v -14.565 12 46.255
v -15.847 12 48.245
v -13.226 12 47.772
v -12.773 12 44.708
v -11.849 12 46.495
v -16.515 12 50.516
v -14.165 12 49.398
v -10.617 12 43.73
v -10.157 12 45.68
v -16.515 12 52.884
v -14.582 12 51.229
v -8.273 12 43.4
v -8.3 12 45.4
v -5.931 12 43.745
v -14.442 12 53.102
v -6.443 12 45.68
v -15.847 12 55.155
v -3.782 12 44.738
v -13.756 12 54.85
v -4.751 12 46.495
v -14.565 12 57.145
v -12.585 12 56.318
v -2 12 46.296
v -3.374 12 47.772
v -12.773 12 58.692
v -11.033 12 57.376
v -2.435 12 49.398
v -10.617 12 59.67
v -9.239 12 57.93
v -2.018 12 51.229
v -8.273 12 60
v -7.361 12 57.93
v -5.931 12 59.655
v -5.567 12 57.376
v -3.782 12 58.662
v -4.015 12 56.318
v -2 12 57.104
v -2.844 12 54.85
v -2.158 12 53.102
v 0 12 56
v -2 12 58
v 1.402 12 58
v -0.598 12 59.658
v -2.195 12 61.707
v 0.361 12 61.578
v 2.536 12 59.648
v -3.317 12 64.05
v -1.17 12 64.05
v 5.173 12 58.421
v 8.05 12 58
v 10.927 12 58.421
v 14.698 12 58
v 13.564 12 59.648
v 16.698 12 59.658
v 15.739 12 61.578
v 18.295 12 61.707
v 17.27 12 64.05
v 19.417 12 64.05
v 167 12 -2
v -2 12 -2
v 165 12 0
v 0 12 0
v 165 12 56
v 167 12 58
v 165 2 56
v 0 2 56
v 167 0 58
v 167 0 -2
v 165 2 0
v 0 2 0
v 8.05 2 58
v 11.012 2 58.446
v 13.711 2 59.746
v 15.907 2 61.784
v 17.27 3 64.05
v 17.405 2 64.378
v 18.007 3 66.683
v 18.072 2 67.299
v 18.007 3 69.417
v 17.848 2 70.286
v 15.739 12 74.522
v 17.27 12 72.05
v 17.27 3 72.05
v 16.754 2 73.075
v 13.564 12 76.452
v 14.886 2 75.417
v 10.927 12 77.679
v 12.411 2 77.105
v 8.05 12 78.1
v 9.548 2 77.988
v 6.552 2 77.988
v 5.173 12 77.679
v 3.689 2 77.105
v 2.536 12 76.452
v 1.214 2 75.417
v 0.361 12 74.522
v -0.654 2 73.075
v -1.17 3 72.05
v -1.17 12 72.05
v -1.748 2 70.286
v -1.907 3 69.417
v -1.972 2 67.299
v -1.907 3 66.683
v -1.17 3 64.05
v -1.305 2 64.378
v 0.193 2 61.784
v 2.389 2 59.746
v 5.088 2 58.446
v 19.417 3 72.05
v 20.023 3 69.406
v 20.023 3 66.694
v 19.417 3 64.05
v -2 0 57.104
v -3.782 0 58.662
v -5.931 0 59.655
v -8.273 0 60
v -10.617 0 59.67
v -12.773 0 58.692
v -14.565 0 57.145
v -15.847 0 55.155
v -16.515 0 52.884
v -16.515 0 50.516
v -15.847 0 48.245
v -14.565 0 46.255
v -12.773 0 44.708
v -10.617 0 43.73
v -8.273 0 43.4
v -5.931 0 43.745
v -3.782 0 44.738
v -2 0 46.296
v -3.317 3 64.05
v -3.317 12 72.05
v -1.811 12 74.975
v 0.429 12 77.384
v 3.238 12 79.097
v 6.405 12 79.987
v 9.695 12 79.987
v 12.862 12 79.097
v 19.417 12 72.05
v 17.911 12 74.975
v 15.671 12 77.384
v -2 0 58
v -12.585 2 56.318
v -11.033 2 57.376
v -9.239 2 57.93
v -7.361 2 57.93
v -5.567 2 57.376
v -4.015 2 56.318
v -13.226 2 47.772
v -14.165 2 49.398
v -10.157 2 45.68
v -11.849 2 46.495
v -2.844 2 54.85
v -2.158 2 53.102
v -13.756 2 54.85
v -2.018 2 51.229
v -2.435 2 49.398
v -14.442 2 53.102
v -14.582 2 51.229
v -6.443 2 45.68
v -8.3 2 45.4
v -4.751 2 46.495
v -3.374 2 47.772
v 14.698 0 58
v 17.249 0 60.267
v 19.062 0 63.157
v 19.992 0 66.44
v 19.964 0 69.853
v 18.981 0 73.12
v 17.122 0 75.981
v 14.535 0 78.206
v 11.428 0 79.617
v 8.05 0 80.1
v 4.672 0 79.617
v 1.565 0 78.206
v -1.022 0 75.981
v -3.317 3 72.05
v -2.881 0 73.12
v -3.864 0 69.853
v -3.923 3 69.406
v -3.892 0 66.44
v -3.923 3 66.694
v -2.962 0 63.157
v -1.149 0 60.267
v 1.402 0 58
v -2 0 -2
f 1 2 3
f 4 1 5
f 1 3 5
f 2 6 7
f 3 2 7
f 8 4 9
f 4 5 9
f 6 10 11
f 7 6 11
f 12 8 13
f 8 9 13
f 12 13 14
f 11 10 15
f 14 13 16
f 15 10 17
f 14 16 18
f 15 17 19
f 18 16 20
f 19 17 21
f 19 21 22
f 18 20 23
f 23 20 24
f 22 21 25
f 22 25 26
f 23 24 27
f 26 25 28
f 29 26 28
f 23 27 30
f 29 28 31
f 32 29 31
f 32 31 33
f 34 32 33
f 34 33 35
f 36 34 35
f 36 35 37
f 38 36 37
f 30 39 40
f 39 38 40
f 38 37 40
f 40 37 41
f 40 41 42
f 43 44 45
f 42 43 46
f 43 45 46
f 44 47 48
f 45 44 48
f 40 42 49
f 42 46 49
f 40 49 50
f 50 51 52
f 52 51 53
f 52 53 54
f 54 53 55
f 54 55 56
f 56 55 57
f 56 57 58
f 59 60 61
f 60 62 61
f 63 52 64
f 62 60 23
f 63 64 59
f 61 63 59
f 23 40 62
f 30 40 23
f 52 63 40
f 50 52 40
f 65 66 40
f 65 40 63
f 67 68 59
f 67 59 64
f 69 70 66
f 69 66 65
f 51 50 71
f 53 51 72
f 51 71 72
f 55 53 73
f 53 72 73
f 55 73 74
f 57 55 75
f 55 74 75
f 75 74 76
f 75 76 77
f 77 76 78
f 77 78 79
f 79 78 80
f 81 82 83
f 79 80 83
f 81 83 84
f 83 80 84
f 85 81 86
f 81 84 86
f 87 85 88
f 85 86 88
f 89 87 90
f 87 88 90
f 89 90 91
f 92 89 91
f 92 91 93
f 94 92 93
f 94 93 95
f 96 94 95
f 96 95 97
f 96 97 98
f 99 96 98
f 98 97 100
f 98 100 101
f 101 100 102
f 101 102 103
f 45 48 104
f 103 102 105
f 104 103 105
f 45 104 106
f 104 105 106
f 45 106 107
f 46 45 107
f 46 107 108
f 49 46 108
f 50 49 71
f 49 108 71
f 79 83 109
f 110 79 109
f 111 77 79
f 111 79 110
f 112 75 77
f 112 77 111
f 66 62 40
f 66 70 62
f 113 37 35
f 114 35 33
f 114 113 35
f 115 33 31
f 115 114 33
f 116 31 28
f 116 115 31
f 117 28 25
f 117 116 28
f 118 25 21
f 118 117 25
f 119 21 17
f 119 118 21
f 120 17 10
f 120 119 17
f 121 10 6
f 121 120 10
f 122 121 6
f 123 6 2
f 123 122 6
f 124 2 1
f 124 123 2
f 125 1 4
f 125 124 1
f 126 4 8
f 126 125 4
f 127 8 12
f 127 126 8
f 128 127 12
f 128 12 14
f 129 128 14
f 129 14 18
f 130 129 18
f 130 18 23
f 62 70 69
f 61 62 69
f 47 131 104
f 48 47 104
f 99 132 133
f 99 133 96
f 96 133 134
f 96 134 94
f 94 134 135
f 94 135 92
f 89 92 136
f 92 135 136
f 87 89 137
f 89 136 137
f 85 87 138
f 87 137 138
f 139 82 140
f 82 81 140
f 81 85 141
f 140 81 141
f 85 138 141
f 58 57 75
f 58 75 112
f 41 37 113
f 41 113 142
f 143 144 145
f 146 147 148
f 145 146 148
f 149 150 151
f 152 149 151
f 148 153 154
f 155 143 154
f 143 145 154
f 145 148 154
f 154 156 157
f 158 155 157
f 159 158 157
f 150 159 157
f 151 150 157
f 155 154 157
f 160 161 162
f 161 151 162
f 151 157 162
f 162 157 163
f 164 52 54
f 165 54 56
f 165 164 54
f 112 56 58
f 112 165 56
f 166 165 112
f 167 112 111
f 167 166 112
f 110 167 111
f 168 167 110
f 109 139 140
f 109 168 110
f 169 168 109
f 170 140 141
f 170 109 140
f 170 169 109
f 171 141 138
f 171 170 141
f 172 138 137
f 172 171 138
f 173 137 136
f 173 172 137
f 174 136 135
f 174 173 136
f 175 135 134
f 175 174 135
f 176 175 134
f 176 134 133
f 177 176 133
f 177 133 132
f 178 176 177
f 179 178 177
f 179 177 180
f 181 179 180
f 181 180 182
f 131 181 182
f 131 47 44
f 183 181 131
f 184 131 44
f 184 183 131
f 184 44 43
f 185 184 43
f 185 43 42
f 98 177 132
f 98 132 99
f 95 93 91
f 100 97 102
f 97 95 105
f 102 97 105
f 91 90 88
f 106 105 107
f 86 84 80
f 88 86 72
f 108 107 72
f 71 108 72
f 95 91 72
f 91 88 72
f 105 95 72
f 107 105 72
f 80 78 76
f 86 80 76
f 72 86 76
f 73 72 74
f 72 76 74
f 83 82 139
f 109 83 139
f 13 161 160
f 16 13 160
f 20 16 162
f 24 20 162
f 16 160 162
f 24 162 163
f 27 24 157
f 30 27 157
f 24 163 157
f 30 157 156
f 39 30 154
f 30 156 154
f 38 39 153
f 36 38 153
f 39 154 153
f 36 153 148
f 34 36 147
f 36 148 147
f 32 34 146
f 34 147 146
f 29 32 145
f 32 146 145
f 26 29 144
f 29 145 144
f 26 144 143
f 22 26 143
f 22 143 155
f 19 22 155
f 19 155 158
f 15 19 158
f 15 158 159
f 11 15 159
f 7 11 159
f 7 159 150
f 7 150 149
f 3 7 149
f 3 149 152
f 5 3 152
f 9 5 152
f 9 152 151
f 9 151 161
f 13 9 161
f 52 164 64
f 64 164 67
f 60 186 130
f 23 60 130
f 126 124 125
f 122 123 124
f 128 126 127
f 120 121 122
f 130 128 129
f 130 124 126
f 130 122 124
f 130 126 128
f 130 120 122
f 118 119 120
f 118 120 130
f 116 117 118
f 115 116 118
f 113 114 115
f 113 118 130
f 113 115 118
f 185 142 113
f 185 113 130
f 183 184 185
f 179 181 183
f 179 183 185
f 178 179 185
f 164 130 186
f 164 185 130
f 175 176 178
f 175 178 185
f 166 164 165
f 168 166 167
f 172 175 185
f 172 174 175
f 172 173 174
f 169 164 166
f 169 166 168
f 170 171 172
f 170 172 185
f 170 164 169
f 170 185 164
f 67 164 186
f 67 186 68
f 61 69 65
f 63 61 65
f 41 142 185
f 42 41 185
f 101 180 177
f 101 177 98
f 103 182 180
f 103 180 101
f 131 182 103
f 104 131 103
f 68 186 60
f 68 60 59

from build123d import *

# Parameters (mm, degrees)
SKETCH_1_W          = 165
SKETCH_1_H          = 56
EXTRUDE_1_DEPTH     = 2
SKETCH_3_W          = 169
SKETCH_3_H          = 60
SKETCH_3_W_2        = 165
SKETCH_3_H_2        = 56
EXTRUDE_2_DEPTH     = 12
SKETCH_4_R          = 10.05
EXTRUDE_3_DEPTH     = 2
SKETCH_5_R          = 12.05
SKETCH_5_R_2        = 10.05
EXTRUDE_4_DEPTH     = 12
SKETCH_6_W          = 46.432971474
SKETCH_6_H          = 8
CUT_EXTRUDE_1_DEPTH = 9
SKETCH_7_R          = 6.3
EXTRUDE_5_DEPTH     = 2
SKETCH_8_R          = 8.3
SKETCH_8_R_2        = 6.3
EXTRUDE_6_DEPTH     = 12


with BuildPart() as part:
    # 草图1 → 凸台-拉伸1 (new body)
    with BuildSketch(Plane(origin=(0, 0, 0), x_dir=(1, 0, 0), z_dir=(0, 1, 0))):
        with Locations((82.5, -28)):
            Rectangle(SKETCH_1_W, SKETCH_1_H)
    extrude(amount=EXTRUDE_1_DEPTH)

    # 草图3 → 凸台-拉伸2 (add)
    with BuildSketch(Plane.XZ):
        with Locations((82.5, 28)):
            Rectangle(SKETCH_3_W, SKETCH_3_H)
        with Locations((82.5, 28)):
            Rectangle(SKETCH_3_W_2, SKETCH_3_H_2, mode=Mode.SUBTRACT)
    extrude(amount=-EXTRUDE_2_DEPTH)



with BuildPart() as body_2:
    # 草图4 → 凸台-拉伸3 (new body)
    with BuildSketch(Plane.XZ):
        with Locations(Location((8.05, 68.05, 0), (0, 0, 270))):
            Circle(SKETCH_4_R)
    extrude(amount=-EXTRUDE_3_DEPTH)


with BuildPart() as part_1:
    add(part.part)

    add(body_2.part)  # 凸台-拉伸4 merges body 2
    # 草图5 → 凸台-拉伸4 (add)
    with BuildSketch(Plane.XZ):
        with Locations((8.05, 68.05)):
            Circle(SKETCH_5_R)
        with Locations(Location((8.05, 68.05, 0), (0, 0, 270))):
            Circle(SKETCH_5_R_2, mode=Mode.SUBTRACT)
    extrude(amount=-EXTRUDE_4_DEPTH)

    # 草图6 → 切除-拉伸1 (cut)
    with BuildSketch(Plane(origin=(0, 12, 0), x_dir=(1, 0, 0), z_dir=(0, 1, 0))):
        with Locations((8.05, -68.05)):
            Rectangle(SKETCH_6_W, SKETCH_6_H)
    extrude(amount=-CUT_EXTRUDE_1_DEPTH, mode=Mode.SUBTRACT)



with BuildPart() as body_2_2:
    # 草图7 → 凸台-拉伸5 (new body)
    with BuildSketch(Plane.XZ):
        with Locations(Location((-8.3, 51.7, 0), (0, 0, 270))):
            Circle(SKETCH_7_R)
    extrude(amount=-EXTRUDE_5_DEPTH)


with BuildPart() as part_2:
    add(part_1.part)

    add(body_2_2.part)  # 凸台-拉伸6 merges body 2 2
    # 草图8 → 凸台-拉伸6 (add)
    with BuildSketch(Plane.XZ):
        with Locations((-8.3, 51.7)):
            Circle(SKETCH_8_R)
        with Locations(Location((-8.3, 51.7, 0), (0, 0, 270))):
            Circle(SKETCH_8_R_2, mode=Mode.SUBTRACT)
    extrude(amount=-EXTRUDE_6_DEPTH)


solid = part_2.part
